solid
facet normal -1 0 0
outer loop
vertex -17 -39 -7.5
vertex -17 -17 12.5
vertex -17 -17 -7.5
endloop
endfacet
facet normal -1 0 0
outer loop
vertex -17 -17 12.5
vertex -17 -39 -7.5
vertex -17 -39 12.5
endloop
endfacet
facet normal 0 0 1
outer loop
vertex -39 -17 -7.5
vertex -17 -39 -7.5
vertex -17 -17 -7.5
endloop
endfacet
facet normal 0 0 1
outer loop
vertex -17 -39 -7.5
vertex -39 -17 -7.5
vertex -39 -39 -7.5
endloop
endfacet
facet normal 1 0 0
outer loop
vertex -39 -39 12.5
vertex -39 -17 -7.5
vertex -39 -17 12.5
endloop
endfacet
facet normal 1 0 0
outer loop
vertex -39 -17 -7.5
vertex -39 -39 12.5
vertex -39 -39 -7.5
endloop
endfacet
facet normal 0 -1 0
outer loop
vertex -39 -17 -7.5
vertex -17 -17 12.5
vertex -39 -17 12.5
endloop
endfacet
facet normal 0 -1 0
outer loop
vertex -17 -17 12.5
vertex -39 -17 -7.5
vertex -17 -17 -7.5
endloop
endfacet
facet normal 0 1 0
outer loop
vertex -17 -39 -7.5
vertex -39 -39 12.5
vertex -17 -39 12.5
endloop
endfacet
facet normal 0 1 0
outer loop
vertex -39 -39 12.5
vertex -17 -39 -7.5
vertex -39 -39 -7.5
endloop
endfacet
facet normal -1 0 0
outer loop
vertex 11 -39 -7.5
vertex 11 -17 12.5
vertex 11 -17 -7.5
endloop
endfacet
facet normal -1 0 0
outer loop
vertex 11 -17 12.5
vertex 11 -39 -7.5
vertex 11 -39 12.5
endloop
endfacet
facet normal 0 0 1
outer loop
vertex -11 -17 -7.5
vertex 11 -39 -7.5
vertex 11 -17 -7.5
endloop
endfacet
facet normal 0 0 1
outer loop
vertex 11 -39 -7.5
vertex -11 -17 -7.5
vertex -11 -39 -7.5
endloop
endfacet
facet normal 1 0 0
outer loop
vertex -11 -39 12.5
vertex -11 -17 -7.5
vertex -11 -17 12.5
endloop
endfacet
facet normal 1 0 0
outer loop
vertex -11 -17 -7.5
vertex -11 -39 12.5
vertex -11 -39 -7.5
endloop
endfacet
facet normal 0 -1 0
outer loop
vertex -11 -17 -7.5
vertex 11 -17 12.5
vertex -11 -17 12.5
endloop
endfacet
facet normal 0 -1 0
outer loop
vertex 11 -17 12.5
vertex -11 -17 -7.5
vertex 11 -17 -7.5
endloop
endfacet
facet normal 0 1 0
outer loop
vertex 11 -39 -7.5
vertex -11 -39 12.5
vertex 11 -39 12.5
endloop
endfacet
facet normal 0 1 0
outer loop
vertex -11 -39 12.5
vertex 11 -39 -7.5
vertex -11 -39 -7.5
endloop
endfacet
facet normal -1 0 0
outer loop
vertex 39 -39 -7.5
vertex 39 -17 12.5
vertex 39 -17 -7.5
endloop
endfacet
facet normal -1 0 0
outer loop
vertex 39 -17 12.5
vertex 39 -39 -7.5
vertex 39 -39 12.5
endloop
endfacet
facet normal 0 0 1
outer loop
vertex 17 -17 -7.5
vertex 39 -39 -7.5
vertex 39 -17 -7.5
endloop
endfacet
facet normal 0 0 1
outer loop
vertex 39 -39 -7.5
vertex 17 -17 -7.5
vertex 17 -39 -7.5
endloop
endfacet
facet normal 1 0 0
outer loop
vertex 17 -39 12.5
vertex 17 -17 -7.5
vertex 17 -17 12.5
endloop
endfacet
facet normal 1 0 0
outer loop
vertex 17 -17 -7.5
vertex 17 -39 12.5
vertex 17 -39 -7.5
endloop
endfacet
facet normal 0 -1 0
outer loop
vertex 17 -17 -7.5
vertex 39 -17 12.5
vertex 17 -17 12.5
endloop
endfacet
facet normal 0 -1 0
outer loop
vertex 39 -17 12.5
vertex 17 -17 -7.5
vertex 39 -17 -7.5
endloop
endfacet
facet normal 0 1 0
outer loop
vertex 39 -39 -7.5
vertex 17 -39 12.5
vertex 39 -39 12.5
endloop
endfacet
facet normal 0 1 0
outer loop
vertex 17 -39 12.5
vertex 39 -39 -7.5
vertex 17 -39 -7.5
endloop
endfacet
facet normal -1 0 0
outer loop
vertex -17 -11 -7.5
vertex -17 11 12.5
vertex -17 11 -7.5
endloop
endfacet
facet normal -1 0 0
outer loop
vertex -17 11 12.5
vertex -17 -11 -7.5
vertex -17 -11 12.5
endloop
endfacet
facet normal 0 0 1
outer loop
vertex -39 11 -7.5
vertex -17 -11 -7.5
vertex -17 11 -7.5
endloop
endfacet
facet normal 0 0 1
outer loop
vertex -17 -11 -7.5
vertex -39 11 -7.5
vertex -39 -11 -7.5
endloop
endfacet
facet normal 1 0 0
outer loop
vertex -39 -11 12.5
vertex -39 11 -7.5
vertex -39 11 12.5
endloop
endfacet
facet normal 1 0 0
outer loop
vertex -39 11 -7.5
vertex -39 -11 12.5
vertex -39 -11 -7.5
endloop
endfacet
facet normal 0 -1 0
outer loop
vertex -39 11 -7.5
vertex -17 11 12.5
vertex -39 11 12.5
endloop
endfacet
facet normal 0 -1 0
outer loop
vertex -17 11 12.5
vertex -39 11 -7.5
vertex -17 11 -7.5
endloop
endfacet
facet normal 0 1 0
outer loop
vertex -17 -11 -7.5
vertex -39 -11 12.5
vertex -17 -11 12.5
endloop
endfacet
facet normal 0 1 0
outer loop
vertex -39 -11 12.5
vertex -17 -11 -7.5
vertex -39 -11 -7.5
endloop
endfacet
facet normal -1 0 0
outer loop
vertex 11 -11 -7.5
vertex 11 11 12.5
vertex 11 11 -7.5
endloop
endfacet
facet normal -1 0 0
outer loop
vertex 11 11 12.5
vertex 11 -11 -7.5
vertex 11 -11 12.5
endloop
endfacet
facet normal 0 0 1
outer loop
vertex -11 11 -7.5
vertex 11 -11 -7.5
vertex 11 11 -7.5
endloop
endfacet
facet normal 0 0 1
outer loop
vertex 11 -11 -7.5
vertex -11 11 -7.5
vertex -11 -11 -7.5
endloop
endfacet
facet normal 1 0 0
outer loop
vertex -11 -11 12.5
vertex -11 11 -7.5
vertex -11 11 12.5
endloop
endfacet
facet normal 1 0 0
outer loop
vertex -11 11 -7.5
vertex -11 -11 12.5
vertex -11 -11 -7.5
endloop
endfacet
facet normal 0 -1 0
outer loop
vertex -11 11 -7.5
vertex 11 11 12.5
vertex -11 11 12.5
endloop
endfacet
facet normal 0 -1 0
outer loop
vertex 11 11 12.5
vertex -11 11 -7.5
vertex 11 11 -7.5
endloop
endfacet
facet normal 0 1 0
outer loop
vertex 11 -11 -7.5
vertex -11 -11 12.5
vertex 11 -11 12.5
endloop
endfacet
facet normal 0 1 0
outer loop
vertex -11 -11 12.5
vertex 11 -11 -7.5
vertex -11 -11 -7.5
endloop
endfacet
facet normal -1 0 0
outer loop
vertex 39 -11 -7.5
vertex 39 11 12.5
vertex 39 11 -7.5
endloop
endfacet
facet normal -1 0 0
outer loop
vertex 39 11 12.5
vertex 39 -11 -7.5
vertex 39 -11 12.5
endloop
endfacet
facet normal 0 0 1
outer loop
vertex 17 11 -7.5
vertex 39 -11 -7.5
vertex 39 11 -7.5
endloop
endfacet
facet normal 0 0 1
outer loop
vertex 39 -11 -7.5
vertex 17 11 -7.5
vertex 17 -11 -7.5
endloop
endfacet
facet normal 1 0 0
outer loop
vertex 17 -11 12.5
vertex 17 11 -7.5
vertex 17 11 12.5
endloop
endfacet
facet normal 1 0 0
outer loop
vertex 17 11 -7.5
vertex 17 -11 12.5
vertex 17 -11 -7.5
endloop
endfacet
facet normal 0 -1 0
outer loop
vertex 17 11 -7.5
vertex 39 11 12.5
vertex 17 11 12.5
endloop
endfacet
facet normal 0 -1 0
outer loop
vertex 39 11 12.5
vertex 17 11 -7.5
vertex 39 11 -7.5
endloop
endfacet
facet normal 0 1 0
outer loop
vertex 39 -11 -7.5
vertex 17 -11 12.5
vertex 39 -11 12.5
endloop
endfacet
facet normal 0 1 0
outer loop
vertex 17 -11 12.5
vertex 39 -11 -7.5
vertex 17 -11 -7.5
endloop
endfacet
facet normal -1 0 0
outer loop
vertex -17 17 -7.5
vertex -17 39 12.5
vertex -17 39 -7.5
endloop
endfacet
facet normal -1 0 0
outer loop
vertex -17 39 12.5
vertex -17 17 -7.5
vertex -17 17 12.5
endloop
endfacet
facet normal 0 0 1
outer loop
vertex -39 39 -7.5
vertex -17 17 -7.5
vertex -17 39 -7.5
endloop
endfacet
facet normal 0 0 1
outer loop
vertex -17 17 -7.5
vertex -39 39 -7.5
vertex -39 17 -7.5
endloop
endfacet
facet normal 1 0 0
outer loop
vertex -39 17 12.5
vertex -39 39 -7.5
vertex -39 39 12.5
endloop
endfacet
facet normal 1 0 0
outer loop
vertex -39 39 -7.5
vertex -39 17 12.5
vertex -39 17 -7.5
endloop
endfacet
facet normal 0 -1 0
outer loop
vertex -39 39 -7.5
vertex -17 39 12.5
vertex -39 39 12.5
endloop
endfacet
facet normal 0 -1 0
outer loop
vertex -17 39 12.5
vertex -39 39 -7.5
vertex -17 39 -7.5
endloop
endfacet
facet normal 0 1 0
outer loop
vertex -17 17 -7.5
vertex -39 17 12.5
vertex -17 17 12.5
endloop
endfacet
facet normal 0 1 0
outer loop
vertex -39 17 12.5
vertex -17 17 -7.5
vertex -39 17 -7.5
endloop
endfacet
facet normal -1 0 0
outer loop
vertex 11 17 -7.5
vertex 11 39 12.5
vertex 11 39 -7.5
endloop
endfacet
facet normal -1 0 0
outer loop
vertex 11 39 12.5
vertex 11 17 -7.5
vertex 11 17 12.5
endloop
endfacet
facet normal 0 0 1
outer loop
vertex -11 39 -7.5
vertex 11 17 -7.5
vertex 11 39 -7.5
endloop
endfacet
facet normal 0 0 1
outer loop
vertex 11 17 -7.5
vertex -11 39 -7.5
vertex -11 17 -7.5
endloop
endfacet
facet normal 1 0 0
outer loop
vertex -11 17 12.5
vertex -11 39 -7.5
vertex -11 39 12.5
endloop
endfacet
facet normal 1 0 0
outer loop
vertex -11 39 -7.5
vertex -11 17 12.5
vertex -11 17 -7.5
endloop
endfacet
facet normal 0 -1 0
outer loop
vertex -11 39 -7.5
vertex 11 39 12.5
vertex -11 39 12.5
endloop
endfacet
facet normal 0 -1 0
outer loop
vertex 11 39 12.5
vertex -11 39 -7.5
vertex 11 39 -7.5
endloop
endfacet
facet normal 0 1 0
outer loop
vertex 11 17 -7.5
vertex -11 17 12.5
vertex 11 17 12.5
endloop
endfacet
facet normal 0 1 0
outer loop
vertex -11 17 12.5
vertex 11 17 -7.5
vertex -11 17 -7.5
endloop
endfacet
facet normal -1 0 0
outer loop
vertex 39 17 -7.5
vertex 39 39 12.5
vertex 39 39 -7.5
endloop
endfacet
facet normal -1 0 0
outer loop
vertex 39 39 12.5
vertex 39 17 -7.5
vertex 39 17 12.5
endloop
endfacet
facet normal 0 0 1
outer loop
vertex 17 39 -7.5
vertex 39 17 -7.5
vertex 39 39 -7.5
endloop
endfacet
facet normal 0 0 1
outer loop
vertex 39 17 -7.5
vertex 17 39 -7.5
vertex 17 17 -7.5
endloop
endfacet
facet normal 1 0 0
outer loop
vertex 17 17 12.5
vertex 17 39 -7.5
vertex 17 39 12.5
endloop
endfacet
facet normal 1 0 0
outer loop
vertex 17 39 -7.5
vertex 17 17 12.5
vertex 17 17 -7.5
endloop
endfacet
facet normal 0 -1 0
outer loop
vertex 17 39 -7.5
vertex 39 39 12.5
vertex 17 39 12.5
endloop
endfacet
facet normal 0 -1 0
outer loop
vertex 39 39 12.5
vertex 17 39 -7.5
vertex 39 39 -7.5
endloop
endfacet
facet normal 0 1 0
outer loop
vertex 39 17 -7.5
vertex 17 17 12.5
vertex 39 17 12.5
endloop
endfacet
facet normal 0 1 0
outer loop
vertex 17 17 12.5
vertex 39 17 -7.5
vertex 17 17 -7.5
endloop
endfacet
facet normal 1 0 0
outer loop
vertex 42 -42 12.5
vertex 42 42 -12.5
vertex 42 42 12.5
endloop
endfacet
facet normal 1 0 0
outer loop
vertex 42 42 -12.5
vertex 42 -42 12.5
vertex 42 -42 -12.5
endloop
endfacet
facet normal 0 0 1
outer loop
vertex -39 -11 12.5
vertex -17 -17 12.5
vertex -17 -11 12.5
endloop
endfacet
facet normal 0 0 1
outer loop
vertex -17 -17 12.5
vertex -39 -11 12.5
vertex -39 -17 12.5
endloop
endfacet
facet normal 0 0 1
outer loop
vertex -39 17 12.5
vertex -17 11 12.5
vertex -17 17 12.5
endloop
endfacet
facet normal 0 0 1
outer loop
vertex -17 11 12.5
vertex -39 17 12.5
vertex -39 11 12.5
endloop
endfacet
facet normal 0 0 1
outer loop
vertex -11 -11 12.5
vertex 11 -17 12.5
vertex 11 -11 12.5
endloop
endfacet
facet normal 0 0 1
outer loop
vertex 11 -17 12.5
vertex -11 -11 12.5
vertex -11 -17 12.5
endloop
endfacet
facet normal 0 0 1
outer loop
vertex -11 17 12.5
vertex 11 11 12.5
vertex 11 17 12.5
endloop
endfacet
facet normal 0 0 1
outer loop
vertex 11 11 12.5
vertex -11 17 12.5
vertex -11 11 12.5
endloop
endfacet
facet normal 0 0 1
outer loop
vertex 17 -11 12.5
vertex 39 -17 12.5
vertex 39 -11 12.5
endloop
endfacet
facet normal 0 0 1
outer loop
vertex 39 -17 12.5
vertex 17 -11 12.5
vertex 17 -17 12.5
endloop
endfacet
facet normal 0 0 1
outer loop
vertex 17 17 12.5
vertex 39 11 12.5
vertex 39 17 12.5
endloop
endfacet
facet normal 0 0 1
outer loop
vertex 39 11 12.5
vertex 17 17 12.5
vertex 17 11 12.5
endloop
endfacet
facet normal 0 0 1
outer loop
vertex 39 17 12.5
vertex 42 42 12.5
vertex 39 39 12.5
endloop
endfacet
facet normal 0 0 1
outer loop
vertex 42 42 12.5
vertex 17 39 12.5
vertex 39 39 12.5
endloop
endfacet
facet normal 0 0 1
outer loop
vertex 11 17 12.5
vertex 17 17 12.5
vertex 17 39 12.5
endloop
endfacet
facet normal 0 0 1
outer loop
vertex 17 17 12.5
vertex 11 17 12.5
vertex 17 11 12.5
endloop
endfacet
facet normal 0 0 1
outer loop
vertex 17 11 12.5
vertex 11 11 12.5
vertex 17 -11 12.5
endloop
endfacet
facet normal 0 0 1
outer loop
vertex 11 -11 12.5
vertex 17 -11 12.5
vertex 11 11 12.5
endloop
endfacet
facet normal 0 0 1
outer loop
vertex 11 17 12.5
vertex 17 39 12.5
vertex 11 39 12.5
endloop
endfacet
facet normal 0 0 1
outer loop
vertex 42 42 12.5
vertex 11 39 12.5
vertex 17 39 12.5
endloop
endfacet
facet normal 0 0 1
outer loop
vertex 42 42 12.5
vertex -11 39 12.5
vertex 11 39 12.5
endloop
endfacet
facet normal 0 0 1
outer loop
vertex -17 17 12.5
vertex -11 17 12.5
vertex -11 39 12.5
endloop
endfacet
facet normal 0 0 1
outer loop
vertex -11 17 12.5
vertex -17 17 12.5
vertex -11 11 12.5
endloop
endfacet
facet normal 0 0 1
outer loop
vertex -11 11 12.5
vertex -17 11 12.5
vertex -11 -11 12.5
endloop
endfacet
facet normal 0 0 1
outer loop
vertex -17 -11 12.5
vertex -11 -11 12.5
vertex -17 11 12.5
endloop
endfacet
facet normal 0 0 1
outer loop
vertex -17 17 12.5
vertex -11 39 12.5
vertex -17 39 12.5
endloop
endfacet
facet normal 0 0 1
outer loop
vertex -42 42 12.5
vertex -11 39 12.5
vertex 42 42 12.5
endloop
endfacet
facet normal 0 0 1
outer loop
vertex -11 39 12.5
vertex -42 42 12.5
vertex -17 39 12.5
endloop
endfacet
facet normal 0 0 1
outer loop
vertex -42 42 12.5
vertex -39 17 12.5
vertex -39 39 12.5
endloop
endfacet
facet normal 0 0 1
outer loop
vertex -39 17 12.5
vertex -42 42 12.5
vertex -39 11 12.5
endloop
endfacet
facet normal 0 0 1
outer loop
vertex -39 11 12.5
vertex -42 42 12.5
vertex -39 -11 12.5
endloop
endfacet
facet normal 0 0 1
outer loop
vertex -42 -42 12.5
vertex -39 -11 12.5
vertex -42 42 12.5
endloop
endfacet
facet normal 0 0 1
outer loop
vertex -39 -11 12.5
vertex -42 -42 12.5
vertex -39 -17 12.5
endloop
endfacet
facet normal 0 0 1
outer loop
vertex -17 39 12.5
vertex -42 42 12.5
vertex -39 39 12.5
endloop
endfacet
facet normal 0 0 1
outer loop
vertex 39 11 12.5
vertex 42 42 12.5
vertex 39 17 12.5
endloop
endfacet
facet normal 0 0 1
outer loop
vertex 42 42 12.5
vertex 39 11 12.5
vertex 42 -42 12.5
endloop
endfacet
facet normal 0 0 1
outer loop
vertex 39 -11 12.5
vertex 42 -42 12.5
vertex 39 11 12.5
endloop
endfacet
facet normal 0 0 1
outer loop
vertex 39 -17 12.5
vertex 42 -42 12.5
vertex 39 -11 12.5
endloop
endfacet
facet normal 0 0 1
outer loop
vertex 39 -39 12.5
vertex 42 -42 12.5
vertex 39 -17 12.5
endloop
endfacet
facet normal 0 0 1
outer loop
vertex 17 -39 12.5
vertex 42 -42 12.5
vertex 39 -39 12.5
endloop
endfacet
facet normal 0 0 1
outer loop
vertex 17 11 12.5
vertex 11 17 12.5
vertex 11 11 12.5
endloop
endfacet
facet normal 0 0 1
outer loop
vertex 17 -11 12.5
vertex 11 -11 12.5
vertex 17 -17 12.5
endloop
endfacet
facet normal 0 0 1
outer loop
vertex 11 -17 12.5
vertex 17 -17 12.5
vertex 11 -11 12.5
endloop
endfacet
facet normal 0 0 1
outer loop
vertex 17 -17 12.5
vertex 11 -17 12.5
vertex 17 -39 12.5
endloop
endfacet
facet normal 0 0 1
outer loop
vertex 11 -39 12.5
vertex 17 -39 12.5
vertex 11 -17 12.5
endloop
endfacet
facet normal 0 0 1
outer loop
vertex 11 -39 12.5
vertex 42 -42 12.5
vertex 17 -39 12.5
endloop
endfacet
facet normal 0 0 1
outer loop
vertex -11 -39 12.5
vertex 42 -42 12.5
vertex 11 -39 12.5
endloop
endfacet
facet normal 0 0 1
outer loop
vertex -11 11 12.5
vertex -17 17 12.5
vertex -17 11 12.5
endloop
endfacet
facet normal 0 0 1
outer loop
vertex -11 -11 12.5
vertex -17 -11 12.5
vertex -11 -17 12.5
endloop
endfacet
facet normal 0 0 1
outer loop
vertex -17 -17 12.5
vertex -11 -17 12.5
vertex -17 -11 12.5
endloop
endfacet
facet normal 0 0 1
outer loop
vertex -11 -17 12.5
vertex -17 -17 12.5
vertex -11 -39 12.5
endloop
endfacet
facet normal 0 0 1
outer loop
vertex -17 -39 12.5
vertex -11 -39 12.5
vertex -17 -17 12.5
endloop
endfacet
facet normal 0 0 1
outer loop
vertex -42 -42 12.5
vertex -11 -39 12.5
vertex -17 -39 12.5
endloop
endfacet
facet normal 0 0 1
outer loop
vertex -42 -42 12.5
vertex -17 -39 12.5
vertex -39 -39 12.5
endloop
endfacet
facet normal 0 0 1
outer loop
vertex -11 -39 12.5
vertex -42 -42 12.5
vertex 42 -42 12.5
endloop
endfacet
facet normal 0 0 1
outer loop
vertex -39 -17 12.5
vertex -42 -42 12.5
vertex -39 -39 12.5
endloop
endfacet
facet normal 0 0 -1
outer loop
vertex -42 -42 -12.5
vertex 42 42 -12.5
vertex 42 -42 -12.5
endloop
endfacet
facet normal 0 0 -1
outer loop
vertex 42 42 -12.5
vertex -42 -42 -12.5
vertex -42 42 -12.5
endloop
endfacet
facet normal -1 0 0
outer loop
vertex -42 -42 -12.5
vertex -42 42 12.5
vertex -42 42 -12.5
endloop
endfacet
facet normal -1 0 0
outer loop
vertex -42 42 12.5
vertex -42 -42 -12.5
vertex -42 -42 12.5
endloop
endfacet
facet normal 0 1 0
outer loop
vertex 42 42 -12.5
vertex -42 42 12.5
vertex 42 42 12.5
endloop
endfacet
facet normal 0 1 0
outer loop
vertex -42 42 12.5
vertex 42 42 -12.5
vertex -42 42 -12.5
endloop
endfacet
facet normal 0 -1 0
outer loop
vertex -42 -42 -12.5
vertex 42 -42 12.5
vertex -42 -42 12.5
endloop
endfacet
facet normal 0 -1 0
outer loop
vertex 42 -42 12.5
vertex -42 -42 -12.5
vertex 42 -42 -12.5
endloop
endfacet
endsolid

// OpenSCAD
$fn = 32;

// ----------------------------------------------------------------------
// Pocket plate 84 x 84 x 25
// 3 x 3 pockets 22 mm square, 20 mm deep
// ----------------------------------------------------------------------

// --- parameters (mm) ---
thickness = 25;  // plate thickness
floor_t = 5;     // material left under each pocket
pocket = 22;     // pocket side length
pitch_x = 28;    // pocket pitch along X
pitch_y = 28;    // pocket pitch along Y
cols = 3;        // pockets per row
rows = 3;        // rows of pockets

// --- derived feature positions (mm) ---
depth = thickness - floor_t;        // = 20   pocket depth, down to the floor
span_x = (cols - 1) * pitch_x;      // = 56   distance between outer pockets
span_y = (rows - 1) * pitch_y;      // = 56   distance between outer pocket rows
origin_x = -span_x / 2;             // = -28   X of the first pocket
origin_y = -span_y / 2;             // = -28   Y of the first pocket
plate = [span_x + pocket + 6, span_y + pocket + 6, thickness];  // = [84, 84, 25]   overall size: pockets plus 3 mm of wall on each side
feature_centers = [
  [origin_x + 0 * pitch_x, origin_y + 0 * pitch_y],
  [origin_x + 1 * pitch_x, origin_y + 0 * pitch_y],
  [origin_x + 2 * pitch_x, origin_y + 0 * pitch_y],
  [origin_x + 0 * pitch_x, origin_y + 1 * pitch_y],
  [origin_x + 1 * pitch_x, origin_y + 1 * pitch_y],
  [origin_x + 2 * pitch_x, origin_y + 1 * pitch_y],
  [origin_x + 0 * pitch_x, origin_y + 2 * pitch_y],
  [origin_x + 1 * pitch_x, origin_y + 2 * pitch_y],
  [origin_x + 2 * pitch_x, origin_y + 2 * pitch_y]
];   // pocket centres, used verbatim by the cutter loop

// plate outline, then one pocket per centre in feature_centers
difference() {
  cube(plate, center = true);
  for (centre = feature_centers)
    translate([centre[0] - pocket / 2, centre[1] - pocket / 2, plate[2] / 2 - depth])
      cube([pocket, pocket, depth + 1]);  // centred on the declared pocket centre
}
